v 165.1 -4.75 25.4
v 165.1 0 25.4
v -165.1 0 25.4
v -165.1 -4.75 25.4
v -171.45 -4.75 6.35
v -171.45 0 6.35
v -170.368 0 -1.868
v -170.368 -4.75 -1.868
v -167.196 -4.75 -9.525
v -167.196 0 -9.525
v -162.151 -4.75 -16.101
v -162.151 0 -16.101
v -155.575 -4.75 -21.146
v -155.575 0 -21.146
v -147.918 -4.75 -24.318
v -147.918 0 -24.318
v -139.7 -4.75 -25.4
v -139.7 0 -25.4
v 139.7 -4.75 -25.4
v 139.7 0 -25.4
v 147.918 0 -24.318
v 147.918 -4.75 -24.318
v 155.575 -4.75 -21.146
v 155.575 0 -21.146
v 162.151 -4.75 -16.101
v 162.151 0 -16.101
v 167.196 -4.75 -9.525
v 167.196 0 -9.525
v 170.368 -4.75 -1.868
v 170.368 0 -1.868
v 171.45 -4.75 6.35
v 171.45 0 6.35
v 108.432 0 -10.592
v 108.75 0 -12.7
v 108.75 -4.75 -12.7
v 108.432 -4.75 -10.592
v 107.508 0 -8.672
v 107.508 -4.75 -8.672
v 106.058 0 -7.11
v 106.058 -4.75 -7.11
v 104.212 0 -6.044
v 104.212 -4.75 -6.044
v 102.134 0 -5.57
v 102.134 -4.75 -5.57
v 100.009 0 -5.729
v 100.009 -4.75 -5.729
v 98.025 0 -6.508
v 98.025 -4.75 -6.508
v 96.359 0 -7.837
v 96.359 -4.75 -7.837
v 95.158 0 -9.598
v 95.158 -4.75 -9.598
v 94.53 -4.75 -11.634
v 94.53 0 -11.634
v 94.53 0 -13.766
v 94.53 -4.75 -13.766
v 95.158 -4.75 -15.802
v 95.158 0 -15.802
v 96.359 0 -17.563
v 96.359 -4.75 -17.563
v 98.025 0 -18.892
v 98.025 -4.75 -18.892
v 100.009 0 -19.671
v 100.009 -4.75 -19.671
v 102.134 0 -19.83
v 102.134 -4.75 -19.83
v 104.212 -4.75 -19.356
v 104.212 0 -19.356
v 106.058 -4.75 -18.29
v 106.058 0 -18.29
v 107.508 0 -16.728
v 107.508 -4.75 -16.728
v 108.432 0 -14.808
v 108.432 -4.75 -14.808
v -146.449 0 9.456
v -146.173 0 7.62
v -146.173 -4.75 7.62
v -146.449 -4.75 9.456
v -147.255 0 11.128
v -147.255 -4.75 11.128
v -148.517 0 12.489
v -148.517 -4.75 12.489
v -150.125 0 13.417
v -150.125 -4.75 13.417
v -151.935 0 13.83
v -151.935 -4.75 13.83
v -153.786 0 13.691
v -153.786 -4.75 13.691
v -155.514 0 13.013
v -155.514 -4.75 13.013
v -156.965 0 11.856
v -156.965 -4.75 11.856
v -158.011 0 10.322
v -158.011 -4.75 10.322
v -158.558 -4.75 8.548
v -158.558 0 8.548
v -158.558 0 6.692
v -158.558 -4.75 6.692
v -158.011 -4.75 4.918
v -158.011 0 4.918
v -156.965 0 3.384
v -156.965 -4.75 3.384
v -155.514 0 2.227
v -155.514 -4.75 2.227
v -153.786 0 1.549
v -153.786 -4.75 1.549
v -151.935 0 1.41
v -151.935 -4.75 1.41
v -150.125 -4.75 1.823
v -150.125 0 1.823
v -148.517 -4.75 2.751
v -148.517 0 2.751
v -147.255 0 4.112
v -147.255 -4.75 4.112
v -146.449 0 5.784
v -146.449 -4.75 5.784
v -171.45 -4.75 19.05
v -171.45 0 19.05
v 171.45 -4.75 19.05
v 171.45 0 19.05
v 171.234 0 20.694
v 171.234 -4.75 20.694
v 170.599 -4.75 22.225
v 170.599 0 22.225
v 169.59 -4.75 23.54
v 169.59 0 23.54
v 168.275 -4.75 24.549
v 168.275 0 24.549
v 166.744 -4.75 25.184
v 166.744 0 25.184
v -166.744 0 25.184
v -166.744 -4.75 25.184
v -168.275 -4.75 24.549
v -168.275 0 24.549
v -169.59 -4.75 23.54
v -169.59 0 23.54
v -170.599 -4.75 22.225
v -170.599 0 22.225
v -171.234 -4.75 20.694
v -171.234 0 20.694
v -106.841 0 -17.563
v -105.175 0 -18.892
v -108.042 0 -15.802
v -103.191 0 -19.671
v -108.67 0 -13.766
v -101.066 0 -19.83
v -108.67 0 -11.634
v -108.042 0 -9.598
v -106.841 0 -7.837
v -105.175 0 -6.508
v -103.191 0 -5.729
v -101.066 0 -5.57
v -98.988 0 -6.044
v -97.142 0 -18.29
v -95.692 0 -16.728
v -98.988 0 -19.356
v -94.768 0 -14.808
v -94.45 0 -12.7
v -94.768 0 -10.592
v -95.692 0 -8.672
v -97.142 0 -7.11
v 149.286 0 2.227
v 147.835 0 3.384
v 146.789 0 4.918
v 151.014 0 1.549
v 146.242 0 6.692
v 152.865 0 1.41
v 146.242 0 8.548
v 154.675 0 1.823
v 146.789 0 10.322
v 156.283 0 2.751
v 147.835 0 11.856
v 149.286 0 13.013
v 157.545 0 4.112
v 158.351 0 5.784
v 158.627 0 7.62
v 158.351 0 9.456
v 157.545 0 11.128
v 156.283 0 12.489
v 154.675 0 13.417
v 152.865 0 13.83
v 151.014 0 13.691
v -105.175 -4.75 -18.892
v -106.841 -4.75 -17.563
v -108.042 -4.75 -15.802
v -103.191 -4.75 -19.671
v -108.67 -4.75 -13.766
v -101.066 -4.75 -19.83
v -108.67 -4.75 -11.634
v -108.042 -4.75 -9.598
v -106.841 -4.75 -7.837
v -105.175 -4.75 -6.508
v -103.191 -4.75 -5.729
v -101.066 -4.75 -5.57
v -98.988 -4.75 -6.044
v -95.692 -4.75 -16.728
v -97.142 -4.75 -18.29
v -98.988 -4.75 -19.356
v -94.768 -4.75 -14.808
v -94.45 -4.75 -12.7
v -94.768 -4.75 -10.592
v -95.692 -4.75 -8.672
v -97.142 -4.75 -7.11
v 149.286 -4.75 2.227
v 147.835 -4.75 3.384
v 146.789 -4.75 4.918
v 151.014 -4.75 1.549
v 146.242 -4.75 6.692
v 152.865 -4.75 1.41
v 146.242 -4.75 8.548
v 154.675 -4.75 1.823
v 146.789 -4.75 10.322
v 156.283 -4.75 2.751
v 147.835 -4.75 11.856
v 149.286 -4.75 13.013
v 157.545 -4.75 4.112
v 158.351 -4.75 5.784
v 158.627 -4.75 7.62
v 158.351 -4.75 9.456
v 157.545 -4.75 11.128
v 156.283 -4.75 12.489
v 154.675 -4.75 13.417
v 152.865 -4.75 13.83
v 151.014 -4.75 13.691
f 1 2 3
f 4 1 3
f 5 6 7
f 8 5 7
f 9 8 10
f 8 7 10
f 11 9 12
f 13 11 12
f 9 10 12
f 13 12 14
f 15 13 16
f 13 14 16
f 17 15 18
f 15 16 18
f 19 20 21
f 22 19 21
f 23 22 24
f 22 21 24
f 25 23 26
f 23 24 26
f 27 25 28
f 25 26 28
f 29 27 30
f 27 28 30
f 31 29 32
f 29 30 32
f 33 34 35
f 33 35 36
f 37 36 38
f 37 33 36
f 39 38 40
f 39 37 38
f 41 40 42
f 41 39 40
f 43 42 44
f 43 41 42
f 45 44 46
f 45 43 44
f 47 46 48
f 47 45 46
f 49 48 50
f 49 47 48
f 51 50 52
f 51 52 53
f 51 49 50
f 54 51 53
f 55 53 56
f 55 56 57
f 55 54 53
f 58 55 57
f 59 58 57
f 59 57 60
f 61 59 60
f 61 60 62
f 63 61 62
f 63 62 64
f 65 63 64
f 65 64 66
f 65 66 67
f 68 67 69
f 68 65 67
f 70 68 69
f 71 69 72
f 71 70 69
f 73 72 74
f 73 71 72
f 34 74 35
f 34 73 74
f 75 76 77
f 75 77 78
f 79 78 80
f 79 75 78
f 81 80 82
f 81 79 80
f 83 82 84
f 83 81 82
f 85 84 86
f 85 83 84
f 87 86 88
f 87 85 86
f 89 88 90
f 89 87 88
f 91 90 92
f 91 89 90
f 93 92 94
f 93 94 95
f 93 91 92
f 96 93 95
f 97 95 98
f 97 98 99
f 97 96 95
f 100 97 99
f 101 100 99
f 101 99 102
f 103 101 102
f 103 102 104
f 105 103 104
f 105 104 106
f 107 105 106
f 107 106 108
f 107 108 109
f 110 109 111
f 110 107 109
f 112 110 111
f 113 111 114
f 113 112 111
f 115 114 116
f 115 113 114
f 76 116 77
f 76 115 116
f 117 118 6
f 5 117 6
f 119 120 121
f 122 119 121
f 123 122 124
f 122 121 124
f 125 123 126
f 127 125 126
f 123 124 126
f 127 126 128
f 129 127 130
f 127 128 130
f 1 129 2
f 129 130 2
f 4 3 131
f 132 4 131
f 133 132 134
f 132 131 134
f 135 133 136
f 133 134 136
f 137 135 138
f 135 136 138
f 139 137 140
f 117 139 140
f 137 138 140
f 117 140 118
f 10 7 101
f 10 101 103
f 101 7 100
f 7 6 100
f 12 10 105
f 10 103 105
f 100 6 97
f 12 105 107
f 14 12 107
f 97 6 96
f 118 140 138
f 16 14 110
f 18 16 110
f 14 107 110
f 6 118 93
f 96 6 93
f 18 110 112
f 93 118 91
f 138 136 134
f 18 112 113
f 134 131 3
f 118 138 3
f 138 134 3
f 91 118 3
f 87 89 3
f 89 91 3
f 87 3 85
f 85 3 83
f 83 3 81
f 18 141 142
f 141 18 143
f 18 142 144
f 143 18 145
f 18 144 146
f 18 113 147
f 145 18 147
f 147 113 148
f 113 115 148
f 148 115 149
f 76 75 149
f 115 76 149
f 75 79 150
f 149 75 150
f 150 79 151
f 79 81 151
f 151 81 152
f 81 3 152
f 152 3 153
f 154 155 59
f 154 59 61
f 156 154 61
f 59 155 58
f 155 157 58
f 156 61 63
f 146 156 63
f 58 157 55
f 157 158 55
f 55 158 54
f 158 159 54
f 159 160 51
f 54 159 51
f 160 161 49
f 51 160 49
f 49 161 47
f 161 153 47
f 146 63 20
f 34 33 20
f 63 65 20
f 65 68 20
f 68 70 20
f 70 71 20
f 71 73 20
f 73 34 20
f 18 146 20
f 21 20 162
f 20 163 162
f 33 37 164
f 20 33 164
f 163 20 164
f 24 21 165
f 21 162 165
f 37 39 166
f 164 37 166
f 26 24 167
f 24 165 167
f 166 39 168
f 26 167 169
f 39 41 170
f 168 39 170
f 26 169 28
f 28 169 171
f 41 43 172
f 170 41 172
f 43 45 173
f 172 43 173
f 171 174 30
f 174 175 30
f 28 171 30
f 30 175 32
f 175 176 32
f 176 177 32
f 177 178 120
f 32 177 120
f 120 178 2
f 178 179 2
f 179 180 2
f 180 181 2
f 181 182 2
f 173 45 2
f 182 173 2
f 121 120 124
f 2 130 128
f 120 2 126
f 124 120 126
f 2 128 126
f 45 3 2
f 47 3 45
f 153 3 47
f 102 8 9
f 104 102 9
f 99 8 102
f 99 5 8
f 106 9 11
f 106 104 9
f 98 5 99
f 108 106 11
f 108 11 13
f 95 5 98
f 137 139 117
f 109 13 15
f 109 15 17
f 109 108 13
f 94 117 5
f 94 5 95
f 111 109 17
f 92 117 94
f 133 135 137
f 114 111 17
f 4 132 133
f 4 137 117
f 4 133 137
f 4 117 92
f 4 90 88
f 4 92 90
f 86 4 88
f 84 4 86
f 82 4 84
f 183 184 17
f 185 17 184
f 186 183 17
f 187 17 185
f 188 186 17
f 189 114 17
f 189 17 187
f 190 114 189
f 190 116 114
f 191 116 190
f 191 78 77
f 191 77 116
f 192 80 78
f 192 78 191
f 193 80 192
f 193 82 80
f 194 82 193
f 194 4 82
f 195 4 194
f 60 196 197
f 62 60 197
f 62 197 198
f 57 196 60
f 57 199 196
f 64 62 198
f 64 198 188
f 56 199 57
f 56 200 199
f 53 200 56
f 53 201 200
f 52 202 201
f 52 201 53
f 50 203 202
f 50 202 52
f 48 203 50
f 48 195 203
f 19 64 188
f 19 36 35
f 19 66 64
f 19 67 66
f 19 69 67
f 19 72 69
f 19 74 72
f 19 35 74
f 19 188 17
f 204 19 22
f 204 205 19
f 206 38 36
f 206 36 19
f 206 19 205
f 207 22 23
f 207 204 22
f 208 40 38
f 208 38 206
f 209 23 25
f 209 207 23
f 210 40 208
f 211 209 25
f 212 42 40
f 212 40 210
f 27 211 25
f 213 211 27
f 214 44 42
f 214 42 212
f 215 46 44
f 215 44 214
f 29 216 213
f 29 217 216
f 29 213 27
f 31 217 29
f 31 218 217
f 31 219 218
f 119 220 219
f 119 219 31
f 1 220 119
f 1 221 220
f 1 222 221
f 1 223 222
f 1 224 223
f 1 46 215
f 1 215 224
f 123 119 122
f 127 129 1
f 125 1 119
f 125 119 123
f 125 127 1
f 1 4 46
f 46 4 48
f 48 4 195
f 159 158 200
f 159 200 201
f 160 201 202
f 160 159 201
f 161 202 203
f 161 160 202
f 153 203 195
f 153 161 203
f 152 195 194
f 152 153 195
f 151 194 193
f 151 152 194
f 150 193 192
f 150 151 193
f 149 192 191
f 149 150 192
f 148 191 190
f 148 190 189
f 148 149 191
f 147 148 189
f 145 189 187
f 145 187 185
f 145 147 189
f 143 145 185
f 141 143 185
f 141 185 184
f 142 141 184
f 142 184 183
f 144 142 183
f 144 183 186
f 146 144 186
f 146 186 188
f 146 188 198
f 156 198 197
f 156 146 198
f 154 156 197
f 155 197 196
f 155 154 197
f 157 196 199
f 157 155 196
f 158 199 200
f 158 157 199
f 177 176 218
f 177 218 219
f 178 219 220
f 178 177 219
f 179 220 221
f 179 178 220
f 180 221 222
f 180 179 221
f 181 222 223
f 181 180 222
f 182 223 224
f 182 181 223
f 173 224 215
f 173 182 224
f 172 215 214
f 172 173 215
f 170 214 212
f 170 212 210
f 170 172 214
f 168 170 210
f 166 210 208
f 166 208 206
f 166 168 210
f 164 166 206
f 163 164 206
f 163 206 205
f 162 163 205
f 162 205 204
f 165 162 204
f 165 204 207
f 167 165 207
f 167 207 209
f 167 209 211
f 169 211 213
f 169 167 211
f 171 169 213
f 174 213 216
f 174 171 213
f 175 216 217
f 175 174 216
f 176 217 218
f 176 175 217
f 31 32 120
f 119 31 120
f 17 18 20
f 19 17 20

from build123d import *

# Parameters (mm, degrees)
F0_R     = 7.1501
F0_R_2   = 6.227401
F1_DEPTH = 4.7498


with BuildPart() as f1:
    # F0 (on Front) → F1 (new body)
    with BuildSketch(Plane.XZ):
        with BuildLine():
            Line((-139.7, -25.4), (139.7, -25.4))
            ThreePointArc((139.7, -25.4), (162.15064, -16.10064), (171.45, 6.35))
            Line((171.45, 6.35), (171.45, 19.05))
            ThreePointArc((171.45, 19.05), (169.590128, 23.540128), (165.1, 25.4))
            Line((165.1, 25.4), (-165.1, 25.4))
            ThreePointArc((-165.1, 25.4), (-169.590128, 23.540128), (-171.45, 19.05))
            Line((-171.45, 19.05), (-171.45, 6.35))
            ThreePointArc((-171.45, 6.35), (-162.15064, -16.10064), (-139.7, -25.4))
        make_face()
        with Locations((-101.6, -12.7)):
            Circle(F0_R, mode=Mode.SUBTRACT)
        with Locations((101.6, -12.7)):
            Circle(F0_R, mode=Mode.SUBTRACT)
        with Locations((-152.4, 7.62)):
            Circle(F0_R_2, mode=Mode.SUBTRACT)
        with Locations((152.4, 7.62)):
            Circle(F0_R_2, mode=Mode.SUBTRACT)
    extrude(amount=F1_DEPTH)


solid = f1.part
